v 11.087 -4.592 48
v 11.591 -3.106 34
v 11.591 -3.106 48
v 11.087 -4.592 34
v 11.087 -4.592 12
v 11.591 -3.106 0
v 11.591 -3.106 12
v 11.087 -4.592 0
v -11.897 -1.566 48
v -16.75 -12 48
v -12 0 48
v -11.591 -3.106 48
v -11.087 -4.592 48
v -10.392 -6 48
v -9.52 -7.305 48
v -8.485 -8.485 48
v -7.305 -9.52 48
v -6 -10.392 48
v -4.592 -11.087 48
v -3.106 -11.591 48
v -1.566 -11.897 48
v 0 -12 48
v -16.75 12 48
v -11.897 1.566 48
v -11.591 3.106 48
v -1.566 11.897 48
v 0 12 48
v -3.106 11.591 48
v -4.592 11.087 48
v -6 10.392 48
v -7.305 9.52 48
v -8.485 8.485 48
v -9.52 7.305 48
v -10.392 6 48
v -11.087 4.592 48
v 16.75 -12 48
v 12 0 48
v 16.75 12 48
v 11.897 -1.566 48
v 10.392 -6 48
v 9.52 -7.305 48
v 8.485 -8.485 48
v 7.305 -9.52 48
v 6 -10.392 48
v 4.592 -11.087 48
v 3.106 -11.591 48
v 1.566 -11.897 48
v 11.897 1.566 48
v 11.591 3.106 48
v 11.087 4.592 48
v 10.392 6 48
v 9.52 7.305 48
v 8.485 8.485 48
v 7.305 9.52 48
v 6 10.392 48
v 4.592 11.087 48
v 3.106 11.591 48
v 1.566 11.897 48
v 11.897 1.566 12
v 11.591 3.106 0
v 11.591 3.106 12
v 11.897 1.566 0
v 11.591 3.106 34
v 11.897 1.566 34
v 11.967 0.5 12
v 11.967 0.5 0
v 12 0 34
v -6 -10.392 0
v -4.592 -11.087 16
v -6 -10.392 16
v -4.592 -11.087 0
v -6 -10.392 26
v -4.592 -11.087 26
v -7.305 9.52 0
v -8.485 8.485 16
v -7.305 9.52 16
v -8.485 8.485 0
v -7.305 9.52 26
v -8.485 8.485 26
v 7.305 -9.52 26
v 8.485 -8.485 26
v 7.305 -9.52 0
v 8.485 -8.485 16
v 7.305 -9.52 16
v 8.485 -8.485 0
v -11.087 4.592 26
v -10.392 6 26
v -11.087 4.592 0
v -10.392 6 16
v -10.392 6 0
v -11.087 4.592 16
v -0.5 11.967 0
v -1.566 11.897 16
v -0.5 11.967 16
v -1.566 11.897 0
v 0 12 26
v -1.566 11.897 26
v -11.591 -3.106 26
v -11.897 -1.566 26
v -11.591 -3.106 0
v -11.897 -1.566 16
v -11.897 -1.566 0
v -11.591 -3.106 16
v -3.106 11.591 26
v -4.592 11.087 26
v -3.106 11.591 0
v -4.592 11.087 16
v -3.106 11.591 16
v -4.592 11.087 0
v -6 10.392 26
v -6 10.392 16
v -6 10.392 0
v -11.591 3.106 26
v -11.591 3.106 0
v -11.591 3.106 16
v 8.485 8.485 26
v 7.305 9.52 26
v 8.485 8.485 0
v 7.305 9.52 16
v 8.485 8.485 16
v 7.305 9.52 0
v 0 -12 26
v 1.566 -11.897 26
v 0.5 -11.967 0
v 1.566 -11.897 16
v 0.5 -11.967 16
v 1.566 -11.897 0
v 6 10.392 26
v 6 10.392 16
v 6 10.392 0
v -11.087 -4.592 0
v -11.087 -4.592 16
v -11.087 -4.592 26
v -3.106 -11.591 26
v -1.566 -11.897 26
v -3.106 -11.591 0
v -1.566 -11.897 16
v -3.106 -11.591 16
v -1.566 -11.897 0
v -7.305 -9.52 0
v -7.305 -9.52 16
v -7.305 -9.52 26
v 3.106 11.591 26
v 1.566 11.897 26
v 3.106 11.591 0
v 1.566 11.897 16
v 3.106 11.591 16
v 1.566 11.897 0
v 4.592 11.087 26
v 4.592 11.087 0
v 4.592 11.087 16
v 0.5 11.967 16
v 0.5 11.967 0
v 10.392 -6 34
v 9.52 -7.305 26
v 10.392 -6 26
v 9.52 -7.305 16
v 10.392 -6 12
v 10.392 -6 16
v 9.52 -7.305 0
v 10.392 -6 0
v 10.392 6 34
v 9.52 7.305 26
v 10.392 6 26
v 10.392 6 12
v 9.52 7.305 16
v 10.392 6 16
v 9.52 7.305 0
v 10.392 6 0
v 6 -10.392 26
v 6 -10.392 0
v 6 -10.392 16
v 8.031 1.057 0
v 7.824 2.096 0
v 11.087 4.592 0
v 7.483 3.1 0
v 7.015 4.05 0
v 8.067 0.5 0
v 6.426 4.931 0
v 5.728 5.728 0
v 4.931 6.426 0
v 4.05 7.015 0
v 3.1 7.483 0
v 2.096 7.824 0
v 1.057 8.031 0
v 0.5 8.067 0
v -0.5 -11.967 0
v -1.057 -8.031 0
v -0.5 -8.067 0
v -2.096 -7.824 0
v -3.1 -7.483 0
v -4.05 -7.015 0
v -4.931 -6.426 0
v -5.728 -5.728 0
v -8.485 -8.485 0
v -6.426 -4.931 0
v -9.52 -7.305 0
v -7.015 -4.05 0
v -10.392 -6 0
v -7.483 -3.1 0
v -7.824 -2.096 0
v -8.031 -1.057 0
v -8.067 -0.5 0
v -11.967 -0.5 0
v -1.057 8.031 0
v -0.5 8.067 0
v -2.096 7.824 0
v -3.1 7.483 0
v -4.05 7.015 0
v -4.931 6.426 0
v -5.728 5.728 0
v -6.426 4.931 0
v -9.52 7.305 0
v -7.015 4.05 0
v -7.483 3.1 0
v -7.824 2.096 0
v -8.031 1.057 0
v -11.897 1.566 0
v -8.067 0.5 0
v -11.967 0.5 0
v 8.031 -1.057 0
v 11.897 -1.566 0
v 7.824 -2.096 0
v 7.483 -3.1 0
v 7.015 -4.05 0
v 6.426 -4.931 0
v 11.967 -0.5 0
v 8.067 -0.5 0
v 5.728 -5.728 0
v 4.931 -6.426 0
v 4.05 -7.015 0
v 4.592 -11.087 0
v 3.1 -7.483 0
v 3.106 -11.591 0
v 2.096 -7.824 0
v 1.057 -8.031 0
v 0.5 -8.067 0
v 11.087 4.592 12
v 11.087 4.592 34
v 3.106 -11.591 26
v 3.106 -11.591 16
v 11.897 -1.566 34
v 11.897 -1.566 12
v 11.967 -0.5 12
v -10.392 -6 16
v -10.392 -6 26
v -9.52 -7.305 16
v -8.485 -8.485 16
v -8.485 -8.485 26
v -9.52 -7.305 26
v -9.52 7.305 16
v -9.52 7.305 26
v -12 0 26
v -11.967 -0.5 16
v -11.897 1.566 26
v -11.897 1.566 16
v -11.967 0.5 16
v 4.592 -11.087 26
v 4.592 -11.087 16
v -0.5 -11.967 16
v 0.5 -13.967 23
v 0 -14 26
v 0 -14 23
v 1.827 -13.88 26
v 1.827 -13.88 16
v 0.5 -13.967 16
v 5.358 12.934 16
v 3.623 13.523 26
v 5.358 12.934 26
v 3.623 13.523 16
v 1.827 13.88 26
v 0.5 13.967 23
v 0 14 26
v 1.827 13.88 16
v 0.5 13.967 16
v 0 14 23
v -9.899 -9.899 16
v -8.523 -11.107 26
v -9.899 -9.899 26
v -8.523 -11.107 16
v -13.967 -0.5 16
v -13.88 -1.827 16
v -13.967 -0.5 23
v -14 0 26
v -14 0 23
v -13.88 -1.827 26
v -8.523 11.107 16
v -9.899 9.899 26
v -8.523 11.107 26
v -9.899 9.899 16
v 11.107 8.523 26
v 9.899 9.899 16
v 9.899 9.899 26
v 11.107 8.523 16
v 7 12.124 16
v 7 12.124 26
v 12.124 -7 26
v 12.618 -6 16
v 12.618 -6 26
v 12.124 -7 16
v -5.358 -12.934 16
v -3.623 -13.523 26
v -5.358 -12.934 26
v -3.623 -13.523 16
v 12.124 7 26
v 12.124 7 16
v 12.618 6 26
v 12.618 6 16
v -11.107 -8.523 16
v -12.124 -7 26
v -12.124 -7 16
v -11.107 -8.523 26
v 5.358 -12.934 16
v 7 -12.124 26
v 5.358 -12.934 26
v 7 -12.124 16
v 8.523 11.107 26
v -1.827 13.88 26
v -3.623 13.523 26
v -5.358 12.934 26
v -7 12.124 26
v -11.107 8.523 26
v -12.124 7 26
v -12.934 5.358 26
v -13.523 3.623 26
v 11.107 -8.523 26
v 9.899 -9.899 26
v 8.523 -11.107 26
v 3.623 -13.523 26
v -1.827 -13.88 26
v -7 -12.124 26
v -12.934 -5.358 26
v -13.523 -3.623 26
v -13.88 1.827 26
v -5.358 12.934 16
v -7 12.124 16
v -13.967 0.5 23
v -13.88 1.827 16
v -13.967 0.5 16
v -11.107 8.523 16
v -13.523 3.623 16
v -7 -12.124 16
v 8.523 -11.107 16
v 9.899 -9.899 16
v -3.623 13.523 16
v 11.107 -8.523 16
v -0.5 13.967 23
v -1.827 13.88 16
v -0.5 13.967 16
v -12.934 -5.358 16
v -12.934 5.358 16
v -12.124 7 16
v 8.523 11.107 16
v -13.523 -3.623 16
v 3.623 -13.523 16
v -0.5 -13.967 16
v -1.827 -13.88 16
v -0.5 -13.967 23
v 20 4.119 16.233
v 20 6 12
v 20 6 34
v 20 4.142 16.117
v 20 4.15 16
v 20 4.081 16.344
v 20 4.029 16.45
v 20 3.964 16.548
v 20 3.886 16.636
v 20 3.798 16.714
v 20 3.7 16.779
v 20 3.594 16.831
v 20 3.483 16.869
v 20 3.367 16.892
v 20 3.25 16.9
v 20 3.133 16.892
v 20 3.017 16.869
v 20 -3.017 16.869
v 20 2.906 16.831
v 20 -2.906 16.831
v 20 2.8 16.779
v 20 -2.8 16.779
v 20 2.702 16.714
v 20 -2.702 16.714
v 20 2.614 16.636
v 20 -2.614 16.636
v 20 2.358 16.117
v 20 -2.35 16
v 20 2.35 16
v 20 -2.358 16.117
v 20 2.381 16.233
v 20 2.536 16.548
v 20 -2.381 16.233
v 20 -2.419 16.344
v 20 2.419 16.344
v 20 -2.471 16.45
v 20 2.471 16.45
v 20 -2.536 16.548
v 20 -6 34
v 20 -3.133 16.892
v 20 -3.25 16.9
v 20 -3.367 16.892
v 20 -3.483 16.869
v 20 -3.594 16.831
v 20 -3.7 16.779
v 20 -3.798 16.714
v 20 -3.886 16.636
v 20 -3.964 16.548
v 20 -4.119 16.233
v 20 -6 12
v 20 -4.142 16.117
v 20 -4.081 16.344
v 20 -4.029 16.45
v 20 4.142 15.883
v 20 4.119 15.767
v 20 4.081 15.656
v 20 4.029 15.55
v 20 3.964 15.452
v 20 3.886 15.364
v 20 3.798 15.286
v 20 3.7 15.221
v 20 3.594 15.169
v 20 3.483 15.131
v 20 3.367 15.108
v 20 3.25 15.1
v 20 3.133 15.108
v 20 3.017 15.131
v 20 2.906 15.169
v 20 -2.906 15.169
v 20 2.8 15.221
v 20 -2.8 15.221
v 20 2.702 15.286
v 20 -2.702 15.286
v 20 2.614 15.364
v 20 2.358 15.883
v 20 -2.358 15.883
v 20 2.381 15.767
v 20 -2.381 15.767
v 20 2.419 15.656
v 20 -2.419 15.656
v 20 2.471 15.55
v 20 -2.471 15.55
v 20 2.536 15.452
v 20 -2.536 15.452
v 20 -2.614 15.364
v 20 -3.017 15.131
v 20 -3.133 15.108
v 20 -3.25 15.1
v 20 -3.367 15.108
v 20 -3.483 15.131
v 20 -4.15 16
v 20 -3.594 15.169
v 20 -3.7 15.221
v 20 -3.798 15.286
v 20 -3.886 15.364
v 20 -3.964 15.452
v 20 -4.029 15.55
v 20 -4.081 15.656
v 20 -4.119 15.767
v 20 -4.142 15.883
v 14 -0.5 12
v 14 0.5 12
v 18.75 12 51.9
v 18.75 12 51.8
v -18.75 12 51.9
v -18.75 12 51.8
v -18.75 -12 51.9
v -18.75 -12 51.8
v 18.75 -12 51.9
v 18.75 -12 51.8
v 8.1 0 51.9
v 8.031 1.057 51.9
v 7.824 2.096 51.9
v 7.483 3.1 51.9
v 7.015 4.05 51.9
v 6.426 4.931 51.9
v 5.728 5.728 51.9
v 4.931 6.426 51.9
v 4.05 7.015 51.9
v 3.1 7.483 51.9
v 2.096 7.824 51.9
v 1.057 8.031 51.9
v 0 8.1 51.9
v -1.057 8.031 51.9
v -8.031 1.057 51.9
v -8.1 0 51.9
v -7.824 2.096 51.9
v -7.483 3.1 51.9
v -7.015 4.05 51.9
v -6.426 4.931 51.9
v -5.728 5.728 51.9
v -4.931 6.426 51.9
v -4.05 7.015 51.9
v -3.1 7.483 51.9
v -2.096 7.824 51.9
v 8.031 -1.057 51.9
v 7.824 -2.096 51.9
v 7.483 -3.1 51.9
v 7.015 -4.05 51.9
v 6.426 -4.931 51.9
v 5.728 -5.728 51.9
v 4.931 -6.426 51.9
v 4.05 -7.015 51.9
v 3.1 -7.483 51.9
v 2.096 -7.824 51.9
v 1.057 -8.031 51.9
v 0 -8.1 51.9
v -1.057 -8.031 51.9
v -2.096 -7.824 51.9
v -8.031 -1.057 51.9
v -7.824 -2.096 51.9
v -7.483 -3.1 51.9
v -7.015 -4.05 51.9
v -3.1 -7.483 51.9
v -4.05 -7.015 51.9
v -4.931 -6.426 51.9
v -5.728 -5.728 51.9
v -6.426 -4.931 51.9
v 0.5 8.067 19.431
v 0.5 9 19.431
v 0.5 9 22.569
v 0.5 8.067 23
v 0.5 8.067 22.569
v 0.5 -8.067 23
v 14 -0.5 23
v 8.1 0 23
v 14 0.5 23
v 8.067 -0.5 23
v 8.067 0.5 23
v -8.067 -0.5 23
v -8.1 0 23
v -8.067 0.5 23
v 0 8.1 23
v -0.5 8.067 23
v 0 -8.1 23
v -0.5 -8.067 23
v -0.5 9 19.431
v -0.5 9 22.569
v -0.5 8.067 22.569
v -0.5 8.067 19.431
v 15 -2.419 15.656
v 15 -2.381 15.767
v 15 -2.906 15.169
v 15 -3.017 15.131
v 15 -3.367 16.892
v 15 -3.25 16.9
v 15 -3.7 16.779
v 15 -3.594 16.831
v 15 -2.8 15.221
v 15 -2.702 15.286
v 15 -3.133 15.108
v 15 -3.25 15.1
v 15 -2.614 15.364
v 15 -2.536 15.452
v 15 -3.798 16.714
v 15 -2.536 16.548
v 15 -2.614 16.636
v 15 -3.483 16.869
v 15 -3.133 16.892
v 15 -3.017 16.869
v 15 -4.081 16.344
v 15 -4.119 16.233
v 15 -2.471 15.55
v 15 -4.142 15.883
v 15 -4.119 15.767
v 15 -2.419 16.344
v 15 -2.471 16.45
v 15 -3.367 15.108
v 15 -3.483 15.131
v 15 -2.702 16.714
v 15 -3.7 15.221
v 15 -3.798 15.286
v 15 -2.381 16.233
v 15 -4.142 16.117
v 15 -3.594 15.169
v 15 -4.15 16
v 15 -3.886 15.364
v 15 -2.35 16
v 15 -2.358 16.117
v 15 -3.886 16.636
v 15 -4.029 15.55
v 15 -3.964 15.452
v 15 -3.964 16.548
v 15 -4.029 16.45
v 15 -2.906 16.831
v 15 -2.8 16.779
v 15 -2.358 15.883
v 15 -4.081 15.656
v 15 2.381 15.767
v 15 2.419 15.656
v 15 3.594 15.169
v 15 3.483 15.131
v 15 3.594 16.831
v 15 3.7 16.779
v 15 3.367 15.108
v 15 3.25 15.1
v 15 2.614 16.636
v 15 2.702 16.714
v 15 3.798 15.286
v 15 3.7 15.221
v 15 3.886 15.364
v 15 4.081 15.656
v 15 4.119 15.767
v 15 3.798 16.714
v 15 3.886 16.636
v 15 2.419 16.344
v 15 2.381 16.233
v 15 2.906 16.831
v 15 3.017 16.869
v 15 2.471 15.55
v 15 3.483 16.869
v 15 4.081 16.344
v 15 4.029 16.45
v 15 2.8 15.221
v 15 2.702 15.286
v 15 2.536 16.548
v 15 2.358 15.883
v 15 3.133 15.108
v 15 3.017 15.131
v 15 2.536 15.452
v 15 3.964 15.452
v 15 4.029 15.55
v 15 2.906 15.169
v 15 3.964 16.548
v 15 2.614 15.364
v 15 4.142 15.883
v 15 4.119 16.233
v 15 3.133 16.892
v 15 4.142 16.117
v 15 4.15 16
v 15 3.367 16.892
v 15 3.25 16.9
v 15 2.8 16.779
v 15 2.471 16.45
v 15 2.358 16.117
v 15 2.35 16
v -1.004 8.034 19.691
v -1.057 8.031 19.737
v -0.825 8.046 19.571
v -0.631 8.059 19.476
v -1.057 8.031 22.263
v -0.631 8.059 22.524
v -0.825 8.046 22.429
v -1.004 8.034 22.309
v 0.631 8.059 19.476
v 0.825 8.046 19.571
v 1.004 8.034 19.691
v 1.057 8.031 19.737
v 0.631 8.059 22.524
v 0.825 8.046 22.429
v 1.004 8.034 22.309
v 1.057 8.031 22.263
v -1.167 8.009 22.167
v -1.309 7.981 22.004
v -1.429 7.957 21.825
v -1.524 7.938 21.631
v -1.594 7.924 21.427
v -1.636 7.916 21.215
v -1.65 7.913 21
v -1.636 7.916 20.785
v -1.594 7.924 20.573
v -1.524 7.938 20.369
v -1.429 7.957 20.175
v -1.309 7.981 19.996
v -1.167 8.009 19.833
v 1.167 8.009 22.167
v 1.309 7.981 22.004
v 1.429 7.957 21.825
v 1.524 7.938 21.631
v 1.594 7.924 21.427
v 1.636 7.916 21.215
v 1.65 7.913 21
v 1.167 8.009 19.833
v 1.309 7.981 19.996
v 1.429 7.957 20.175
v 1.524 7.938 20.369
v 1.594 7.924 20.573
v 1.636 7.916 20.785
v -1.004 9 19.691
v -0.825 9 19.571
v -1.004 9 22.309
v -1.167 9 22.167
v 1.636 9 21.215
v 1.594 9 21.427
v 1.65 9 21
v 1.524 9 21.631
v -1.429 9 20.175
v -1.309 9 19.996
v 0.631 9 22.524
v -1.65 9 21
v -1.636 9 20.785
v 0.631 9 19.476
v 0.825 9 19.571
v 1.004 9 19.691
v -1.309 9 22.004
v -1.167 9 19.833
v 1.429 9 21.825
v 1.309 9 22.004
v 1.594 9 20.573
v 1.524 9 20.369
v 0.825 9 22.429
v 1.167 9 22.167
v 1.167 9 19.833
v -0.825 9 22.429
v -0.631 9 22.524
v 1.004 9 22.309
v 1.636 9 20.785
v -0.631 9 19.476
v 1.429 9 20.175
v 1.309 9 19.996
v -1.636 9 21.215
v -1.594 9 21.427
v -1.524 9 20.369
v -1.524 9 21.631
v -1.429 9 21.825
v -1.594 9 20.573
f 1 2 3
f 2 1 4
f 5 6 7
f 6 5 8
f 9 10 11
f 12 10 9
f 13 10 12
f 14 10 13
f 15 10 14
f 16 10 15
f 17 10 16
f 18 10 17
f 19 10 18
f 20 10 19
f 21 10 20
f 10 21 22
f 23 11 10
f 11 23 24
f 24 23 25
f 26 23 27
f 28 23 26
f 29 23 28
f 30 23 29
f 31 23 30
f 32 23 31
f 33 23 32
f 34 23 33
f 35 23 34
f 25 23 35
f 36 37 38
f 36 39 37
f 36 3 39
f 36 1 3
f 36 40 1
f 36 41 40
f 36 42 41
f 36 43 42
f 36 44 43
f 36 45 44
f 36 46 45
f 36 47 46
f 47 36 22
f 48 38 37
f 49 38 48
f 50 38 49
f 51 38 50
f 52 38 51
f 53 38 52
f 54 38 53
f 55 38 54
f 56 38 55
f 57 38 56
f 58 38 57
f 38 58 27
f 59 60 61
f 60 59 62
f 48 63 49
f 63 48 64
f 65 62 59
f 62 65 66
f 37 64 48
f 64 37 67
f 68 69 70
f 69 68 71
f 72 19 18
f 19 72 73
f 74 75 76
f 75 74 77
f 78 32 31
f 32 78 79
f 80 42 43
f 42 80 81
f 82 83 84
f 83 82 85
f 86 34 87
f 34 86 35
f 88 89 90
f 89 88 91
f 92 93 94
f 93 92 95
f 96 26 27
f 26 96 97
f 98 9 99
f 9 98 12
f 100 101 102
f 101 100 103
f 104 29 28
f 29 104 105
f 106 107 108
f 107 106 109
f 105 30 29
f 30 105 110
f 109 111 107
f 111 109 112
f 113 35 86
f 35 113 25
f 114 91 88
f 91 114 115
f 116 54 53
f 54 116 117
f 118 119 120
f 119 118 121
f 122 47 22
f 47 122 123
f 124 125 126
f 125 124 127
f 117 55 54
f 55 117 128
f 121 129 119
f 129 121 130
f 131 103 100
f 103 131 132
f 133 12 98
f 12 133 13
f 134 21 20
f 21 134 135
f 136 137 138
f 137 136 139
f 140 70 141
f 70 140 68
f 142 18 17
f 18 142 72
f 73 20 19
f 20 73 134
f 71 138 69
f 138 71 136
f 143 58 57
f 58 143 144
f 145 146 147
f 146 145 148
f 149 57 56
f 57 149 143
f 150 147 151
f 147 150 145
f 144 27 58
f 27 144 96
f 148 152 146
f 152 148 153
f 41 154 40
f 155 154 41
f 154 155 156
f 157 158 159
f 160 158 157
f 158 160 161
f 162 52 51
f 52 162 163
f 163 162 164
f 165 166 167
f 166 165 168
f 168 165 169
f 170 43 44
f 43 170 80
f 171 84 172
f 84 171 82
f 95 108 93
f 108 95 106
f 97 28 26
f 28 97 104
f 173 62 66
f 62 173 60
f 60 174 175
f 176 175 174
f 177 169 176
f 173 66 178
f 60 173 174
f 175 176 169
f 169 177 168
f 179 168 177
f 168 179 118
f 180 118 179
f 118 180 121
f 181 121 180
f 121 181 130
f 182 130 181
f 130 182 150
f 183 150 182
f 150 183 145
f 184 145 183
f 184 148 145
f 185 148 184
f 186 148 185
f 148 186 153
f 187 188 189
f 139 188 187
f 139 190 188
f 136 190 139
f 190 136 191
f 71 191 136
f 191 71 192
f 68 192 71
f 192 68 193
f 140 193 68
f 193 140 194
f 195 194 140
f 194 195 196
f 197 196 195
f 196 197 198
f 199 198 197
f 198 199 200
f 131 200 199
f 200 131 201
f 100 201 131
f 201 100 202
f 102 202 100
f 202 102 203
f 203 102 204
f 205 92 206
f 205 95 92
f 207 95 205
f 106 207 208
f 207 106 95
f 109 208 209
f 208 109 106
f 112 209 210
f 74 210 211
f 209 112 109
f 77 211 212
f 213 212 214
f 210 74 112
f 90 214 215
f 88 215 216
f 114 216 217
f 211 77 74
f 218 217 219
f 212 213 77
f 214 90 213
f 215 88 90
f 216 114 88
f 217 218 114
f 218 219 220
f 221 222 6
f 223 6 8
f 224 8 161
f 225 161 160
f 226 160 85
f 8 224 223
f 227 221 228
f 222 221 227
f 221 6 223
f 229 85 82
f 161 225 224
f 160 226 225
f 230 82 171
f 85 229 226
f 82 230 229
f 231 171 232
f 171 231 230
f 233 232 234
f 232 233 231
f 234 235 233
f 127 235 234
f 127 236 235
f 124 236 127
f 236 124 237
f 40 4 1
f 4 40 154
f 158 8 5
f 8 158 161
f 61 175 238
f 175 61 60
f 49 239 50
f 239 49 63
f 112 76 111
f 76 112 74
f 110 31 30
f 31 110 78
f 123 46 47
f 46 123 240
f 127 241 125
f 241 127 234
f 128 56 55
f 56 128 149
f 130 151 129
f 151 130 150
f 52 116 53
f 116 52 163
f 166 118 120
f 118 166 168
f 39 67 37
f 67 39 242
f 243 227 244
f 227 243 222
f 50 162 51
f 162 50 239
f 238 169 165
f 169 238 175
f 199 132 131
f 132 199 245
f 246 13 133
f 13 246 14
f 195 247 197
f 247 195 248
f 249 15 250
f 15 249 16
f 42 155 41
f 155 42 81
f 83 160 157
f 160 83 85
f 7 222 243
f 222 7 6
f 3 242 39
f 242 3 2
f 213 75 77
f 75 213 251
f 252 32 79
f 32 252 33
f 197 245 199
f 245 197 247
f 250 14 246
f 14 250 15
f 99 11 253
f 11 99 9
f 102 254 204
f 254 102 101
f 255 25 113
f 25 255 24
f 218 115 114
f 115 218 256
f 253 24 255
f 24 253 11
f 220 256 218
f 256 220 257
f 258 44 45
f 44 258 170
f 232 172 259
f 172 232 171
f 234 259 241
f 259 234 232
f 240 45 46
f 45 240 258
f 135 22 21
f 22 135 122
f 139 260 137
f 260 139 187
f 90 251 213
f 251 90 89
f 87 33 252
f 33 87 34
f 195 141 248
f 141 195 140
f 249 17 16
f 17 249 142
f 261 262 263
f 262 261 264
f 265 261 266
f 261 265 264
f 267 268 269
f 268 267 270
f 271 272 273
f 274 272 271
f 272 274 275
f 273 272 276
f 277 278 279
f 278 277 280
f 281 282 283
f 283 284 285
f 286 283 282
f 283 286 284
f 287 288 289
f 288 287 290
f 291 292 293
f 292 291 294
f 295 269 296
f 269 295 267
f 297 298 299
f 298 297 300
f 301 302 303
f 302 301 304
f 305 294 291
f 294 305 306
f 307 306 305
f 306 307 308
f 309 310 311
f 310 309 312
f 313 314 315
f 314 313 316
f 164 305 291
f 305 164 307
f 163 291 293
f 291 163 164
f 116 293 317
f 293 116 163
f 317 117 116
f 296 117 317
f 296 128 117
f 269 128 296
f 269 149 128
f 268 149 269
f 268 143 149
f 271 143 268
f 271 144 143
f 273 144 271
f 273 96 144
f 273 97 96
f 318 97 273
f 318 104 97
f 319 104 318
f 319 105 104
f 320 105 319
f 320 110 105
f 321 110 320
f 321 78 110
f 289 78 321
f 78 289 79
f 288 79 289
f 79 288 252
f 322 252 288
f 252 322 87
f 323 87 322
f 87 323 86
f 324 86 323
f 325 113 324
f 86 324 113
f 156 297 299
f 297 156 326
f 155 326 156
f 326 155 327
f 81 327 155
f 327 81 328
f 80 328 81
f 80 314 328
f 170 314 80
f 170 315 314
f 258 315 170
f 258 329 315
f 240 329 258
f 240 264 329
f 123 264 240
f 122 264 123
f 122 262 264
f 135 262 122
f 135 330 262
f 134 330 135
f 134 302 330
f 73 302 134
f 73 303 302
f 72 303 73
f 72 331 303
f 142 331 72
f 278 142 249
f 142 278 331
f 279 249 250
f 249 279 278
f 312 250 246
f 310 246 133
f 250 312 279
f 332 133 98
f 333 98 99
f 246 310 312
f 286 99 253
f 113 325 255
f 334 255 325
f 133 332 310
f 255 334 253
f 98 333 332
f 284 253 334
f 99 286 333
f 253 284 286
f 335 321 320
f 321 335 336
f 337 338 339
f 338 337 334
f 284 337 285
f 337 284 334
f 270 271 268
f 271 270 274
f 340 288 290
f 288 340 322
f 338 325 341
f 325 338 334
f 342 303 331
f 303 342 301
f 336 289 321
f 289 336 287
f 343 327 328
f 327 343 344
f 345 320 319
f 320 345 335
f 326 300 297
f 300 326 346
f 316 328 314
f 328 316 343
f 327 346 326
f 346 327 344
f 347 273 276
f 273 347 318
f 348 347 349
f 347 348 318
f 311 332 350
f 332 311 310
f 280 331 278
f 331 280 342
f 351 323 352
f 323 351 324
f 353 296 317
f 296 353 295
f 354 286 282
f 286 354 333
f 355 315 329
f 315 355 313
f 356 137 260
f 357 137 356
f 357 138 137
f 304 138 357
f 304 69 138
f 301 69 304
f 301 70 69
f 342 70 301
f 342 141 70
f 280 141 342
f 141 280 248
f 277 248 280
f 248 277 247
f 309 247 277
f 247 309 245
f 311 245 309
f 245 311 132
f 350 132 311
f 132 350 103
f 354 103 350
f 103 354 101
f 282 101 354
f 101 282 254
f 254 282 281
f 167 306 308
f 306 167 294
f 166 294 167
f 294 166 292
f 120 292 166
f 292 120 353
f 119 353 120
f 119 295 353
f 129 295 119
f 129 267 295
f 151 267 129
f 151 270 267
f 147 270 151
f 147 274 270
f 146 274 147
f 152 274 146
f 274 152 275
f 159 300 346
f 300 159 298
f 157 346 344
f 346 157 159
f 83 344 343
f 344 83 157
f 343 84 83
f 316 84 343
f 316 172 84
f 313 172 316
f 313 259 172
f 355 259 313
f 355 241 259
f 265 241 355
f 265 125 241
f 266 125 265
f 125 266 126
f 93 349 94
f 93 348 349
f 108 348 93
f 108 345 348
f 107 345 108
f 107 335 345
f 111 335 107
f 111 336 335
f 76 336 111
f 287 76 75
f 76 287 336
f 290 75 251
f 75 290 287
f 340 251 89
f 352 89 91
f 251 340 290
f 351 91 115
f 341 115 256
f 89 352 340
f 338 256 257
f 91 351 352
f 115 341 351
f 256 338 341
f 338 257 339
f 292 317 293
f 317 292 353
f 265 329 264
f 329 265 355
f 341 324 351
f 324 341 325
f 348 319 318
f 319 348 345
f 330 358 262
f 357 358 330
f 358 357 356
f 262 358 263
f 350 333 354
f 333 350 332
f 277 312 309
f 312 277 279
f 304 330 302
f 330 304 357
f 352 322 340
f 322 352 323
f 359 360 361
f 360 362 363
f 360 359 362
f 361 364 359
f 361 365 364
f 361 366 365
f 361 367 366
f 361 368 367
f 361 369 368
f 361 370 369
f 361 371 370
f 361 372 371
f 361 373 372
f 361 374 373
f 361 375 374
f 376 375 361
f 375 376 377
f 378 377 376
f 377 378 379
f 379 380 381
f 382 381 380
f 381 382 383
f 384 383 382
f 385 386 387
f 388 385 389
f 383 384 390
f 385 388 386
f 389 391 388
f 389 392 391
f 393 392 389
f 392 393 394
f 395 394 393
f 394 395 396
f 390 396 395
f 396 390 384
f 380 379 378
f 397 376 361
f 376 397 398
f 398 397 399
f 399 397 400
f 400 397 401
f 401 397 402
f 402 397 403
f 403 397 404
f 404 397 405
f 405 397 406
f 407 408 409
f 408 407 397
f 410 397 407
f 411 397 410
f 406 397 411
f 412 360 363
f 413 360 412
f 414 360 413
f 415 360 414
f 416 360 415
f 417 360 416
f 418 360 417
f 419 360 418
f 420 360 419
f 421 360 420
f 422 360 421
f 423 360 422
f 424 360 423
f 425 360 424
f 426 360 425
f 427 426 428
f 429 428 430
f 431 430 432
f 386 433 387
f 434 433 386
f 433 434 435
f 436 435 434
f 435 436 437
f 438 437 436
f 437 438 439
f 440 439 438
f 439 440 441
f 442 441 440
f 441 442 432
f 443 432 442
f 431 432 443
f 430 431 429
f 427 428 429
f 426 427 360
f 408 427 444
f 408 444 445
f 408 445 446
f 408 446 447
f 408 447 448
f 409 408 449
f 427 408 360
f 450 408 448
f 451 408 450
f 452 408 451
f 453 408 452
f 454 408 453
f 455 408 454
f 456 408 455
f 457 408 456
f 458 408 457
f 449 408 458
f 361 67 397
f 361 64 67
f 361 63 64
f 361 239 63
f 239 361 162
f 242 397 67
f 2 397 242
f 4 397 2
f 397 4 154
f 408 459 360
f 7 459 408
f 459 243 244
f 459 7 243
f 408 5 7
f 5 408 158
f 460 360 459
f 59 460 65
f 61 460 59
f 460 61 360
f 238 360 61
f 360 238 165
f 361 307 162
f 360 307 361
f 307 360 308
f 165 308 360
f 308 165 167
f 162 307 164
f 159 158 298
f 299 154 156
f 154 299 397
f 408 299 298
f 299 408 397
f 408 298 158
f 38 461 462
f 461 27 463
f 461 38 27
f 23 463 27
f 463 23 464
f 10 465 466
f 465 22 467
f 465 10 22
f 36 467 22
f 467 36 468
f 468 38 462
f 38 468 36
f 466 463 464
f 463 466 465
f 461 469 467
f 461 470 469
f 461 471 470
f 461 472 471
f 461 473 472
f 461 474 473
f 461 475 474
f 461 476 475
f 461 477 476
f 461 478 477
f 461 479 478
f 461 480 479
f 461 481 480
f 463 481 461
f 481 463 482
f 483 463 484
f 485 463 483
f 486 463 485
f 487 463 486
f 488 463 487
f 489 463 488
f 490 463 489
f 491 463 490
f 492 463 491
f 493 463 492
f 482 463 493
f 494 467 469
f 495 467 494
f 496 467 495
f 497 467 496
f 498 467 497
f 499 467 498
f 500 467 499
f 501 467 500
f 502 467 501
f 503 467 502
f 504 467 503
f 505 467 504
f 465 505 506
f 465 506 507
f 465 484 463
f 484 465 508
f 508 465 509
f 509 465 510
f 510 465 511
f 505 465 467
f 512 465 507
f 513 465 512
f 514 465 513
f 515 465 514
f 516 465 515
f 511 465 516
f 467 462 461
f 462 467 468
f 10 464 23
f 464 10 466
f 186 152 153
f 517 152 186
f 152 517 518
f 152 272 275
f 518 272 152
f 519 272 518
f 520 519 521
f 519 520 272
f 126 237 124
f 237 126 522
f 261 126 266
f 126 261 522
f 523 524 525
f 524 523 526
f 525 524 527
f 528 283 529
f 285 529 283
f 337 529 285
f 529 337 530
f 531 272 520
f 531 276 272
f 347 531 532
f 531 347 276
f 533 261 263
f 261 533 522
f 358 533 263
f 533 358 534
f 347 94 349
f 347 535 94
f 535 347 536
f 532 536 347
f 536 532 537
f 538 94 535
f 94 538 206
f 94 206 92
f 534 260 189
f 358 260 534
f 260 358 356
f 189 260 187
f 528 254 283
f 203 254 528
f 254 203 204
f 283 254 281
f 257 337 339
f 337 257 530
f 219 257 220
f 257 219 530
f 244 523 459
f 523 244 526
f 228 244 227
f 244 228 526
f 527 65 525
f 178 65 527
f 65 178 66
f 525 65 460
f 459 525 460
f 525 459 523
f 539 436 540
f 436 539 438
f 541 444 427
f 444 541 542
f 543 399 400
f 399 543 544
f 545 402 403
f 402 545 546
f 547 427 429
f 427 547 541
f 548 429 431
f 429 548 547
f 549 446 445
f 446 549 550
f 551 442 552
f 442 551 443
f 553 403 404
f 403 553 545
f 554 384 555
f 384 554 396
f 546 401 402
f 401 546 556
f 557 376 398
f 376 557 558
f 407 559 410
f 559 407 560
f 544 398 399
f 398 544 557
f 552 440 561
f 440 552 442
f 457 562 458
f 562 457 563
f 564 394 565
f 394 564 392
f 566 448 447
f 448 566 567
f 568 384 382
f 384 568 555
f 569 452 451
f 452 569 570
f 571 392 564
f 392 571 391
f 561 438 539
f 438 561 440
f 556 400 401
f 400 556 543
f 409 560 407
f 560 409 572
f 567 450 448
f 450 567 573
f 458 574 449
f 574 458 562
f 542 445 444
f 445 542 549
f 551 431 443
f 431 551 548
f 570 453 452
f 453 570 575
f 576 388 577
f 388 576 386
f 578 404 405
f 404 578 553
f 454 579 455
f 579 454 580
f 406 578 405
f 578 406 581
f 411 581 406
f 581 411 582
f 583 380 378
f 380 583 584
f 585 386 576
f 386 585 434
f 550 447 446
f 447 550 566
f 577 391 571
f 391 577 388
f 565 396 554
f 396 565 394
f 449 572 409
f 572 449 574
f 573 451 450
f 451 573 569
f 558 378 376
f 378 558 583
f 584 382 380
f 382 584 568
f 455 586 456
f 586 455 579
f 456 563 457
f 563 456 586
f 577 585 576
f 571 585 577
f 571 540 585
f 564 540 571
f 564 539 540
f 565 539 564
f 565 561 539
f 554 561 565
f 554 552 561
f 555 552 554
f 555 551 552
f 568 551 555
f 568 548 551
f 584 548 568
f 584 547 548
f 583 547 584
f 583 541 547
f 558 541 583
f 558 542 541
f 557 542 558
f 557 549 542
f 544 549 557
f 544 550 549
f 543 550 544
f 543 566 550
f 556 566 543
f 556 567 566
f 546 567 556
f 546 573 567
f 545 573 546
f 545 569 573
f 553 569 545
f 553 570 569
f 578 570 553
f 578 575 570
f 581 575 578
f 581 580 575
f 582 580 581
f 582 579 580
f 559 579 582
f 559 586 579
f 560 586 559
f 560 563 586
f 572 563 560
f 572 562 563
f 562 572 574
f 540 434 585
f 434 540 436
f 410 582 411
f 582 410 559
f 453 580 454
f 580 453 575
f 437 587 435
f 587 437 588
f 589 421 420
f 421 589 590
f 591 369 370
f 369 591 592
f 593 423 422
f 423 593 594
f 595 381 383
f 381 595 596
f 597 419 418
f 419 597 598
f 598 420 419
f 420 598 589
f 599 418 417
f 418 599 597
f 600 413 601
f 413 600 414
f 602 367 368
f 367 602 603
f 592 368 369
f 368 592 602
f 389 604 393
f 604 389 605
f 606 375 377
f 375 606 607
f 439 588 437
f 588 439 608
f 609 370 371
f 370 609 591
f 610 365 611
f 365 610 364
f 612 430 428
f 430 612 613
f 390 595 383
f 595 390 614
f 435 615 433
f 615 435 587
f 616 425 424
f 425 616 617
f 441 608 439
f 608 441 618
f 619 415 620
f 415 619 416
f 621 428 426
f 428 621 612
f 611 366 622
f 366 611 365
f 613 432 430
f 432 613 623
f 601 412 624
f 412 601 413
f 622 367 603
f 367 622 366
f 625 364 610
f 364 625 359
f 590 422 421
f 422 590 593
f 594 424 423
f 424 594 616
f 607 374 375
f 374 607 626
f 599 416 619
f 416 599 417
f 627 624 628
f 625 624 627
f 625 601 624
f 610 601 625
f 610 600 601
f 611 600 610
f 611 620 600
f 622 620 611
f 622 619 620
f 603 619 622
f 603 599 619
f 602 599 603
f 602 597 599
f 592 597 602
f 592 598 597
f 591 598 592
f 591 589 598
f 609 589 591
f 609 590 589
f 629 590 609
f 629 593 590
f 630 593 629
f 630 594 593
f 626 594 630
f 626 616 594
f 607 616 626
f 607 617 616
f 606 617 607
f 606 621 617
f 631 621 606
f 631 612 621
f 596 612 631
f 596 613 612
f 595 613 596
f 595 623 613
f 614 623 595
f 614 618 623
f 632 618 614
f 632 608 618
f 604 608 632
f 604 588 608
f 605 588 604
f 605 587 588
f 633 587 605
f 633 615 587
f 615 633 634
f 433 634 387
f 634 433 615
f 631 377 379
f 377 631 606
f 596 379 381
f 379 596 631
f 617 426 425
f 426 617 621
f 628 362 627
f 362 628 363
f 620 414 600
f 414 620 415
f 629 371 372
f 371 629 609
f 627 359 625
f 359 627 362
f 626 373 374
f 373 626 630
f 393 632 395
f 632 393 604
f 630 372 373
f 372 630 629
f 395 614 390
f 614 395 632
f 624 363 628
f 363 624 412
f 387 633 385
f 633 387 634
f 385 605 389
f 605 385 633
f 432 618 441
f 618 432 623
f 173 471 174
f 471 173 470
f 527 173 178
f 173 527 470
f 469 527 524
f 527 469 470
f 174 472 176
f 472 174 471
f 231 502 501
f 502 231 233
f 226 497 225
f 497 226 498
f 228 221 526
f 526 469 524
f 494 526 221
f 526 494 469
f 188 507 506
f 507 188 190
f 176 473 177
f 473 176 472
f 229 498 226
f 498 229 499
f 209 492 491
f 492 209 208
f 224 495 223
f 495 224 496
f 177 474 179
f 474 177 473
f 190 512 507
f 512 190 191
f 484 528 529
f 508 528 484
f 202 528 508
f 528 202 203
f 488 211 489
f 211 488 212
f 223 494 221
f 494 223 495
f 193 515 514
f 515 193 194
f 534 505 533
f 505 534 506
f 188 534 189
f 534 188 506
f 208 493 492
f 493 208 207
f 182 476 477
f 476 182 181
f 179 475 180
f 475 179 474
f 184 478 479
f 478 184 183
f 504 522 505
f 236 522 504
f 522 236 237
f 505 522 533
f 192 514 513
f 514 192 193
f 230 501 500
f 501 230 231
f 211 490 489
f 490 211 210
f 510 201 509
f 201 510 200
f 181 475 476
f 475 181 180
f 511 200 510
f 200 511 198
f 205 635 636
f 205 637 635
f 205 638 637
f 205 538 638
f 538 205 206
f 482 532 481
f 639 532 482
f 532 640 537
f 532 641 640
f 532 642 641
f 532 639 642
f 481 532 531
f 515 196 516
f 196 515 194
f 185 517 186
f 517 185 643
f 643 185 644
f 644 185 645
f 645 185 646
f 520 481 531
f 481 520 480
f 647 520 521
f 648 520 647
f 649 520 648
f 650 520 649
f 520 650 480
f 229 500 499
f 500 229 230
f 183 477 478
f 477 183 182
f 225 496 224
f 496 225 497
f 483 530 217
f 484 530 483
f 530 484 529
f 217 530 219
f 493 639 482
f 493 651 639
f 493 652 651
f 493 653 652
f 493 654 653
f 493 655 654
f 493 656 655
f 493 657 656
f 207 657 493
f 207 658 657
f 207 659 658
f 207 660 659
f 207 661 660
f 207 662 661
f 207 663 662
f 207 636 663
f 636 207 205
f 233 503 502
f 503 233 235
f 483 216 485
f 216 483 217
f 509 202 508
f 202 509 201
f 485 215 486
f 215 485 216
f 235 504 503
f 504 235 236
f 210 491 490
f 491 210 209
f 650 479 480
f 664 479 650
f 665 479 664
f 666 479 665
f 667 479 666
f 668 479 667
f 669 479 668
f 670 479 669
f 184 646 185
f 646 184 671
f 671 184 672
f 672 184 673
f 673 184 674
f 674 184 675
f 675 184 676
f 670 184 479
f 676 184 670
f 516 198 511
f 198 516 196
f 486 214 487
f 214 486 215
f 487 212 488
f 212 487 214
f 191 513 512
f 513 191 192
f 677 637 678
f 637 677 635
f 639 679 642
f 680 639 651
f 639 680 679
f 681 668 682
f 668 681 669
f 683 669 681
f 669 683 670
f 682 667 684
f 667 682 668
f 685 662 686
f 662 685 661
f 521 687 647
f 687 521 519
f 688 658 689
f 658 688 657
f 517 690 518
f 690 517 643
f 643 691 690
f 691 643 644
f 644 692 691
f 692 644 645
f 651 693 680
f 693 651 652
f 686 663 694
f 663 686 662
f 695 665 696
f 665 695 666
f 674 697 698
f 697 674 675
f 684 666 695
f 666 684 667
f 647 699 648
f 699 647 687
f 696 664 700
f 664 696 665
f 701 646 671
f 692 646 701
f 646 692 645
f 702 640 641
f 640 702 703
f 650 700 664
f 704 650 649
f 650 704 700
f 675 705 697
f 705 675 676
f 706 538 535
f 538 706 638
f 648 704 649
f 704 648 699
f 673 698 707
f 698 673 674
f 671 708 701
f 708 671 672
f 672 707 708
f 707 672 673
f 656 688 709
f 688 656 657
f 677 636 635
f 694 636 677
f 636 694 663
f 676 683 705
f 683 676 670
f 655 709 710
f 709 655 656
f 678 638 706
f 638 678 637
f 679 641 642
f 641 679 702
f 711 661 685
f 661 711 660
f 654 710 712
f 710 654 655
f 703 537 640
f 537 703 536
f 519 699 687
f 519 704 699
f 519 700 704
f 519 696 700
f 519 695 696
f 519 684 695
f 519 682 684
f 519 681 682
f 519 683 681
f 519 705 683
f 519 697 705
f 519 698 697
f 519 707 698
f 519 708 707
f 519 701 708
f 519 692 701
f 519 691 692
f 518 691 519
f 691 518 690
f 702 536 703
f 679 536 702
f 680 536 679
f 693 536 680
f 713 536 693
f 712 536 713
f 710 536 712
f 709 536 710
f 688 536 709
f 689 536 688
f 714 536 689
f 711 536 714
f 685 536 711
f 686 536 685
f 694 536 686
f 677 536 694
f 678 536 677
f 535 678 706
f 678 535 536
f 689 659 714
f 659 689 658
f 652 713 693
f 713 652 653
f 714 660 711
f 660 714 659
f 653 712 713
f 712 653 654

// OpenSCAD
// PROJECT W.A.L.L. - Module B: Spring-Compliant Paint Marker Actuator
// Drawing Ref: DWG-WALL-CAD-006 | Material: 6061-T6 Aluminum / Acrylic Felt Nib
// Preload Normal Force: 1.20 N (Maintained via ASTM A228 Spring) | Standoff: 0.0 mm (Contact)
// Complies with ISO 2768-mK tolerances

$fn = 48;

// Blueprint Dimensions (Section 5.3)
collet_od = 24.0;
collet_id = 16.2; // Accommodates standard 15.0 - 16.5 mm markers
sleeve_len = 48.0;

knurl_ring_od = 28.0;
knurl_ring_len = 10.0;

spring_seat_od = 12.0;
spring_seat_depth = 8.0;

switch_mount_x = 14.0;
switch_mount_y = 12.0;

dovetail_w_top = 33.5;
dovetail_w_bot = 37.5;
dovetail_h = 3.8;

module paint_marker_module() {
    difference() {
        union() {
            // Main Cylindrical Split-Collet Marker Sleeve
            cylinder(d=collet_od, h=sleeve_len);

            // Knurled Threaded Adjuster Collar Ring
            translate([0, 0, 16.0])
                cylinder(d=knurl_ring_od, h=knurl_ring_len);

            // Omron D2F-01 Micro-Switch Contact Sensor Mounting Bracket
            translate([collet_od/2 - 2, -switch_mount_y/2, 12.0])
                cube([10.0, switch_mount_y, 22.0]);

            // Quick-Release Dovetail Runner (Engages Platform Chassis)
            translate([0, 0, sleeve_len])
                hull() {
                    translate([-dovetail_w_top/2, -collet_od/2, 0])
                        cube([dovetail_w_top, collet_od, 0.1]);
                    translate([-dovetail_w_bot/2, -collet_od/2, dovetail_h])
                        cube([dovetail_w_bot, collet_od, 0.1]);
                }
        }

        // Central Marker Barrel Through-Bore (16.2mm reamed bore)
        translate([0, 0, -1])
            cylinder(d=collet_id, h=sleeve_len + dovetail_h + 2);

        // Helical Compliance Spring Seating Counterbore (Top Face)
        translate([0, 0, sleeve_len - spring_seat_depth])
            cylinder(d=spring_seat_od, h=spring_seat_depth + dovetail_h + 1);

        // 4x Longitudinal Split-Collet Clamping Slots (0.8mm width)
        for (a = [0, 90, 180, 270]) {
            rotate([0, 0, a])
                translate([-0.5, 0, -1])
                    cube([1.0, collet_od/2 + 2, 24.0]);
        }

        // Omron D2F Micro-Switch M2 Mounting Holes (6.5mm pitch)
        translate([collet_od/2 + 3, 0, 16.0]) {
            translate([0, -3.25, 0]) rotate([0, 90, 0]) cylinder(d=1.8, h=10);
            translate([0,  3.25, 0]) rotate([0, 90, 0]) cylinder(d=1.8, h=10);
        }

        // M4 Clamping Screw Through-Hole (Split Collar Tightening)
        translate([0, collet_od/2 - 3, 21.0])
            rotate([90, 0, 0])
                cylinder(d=3.3, h=12);
    }
}

paint_marker_module();
